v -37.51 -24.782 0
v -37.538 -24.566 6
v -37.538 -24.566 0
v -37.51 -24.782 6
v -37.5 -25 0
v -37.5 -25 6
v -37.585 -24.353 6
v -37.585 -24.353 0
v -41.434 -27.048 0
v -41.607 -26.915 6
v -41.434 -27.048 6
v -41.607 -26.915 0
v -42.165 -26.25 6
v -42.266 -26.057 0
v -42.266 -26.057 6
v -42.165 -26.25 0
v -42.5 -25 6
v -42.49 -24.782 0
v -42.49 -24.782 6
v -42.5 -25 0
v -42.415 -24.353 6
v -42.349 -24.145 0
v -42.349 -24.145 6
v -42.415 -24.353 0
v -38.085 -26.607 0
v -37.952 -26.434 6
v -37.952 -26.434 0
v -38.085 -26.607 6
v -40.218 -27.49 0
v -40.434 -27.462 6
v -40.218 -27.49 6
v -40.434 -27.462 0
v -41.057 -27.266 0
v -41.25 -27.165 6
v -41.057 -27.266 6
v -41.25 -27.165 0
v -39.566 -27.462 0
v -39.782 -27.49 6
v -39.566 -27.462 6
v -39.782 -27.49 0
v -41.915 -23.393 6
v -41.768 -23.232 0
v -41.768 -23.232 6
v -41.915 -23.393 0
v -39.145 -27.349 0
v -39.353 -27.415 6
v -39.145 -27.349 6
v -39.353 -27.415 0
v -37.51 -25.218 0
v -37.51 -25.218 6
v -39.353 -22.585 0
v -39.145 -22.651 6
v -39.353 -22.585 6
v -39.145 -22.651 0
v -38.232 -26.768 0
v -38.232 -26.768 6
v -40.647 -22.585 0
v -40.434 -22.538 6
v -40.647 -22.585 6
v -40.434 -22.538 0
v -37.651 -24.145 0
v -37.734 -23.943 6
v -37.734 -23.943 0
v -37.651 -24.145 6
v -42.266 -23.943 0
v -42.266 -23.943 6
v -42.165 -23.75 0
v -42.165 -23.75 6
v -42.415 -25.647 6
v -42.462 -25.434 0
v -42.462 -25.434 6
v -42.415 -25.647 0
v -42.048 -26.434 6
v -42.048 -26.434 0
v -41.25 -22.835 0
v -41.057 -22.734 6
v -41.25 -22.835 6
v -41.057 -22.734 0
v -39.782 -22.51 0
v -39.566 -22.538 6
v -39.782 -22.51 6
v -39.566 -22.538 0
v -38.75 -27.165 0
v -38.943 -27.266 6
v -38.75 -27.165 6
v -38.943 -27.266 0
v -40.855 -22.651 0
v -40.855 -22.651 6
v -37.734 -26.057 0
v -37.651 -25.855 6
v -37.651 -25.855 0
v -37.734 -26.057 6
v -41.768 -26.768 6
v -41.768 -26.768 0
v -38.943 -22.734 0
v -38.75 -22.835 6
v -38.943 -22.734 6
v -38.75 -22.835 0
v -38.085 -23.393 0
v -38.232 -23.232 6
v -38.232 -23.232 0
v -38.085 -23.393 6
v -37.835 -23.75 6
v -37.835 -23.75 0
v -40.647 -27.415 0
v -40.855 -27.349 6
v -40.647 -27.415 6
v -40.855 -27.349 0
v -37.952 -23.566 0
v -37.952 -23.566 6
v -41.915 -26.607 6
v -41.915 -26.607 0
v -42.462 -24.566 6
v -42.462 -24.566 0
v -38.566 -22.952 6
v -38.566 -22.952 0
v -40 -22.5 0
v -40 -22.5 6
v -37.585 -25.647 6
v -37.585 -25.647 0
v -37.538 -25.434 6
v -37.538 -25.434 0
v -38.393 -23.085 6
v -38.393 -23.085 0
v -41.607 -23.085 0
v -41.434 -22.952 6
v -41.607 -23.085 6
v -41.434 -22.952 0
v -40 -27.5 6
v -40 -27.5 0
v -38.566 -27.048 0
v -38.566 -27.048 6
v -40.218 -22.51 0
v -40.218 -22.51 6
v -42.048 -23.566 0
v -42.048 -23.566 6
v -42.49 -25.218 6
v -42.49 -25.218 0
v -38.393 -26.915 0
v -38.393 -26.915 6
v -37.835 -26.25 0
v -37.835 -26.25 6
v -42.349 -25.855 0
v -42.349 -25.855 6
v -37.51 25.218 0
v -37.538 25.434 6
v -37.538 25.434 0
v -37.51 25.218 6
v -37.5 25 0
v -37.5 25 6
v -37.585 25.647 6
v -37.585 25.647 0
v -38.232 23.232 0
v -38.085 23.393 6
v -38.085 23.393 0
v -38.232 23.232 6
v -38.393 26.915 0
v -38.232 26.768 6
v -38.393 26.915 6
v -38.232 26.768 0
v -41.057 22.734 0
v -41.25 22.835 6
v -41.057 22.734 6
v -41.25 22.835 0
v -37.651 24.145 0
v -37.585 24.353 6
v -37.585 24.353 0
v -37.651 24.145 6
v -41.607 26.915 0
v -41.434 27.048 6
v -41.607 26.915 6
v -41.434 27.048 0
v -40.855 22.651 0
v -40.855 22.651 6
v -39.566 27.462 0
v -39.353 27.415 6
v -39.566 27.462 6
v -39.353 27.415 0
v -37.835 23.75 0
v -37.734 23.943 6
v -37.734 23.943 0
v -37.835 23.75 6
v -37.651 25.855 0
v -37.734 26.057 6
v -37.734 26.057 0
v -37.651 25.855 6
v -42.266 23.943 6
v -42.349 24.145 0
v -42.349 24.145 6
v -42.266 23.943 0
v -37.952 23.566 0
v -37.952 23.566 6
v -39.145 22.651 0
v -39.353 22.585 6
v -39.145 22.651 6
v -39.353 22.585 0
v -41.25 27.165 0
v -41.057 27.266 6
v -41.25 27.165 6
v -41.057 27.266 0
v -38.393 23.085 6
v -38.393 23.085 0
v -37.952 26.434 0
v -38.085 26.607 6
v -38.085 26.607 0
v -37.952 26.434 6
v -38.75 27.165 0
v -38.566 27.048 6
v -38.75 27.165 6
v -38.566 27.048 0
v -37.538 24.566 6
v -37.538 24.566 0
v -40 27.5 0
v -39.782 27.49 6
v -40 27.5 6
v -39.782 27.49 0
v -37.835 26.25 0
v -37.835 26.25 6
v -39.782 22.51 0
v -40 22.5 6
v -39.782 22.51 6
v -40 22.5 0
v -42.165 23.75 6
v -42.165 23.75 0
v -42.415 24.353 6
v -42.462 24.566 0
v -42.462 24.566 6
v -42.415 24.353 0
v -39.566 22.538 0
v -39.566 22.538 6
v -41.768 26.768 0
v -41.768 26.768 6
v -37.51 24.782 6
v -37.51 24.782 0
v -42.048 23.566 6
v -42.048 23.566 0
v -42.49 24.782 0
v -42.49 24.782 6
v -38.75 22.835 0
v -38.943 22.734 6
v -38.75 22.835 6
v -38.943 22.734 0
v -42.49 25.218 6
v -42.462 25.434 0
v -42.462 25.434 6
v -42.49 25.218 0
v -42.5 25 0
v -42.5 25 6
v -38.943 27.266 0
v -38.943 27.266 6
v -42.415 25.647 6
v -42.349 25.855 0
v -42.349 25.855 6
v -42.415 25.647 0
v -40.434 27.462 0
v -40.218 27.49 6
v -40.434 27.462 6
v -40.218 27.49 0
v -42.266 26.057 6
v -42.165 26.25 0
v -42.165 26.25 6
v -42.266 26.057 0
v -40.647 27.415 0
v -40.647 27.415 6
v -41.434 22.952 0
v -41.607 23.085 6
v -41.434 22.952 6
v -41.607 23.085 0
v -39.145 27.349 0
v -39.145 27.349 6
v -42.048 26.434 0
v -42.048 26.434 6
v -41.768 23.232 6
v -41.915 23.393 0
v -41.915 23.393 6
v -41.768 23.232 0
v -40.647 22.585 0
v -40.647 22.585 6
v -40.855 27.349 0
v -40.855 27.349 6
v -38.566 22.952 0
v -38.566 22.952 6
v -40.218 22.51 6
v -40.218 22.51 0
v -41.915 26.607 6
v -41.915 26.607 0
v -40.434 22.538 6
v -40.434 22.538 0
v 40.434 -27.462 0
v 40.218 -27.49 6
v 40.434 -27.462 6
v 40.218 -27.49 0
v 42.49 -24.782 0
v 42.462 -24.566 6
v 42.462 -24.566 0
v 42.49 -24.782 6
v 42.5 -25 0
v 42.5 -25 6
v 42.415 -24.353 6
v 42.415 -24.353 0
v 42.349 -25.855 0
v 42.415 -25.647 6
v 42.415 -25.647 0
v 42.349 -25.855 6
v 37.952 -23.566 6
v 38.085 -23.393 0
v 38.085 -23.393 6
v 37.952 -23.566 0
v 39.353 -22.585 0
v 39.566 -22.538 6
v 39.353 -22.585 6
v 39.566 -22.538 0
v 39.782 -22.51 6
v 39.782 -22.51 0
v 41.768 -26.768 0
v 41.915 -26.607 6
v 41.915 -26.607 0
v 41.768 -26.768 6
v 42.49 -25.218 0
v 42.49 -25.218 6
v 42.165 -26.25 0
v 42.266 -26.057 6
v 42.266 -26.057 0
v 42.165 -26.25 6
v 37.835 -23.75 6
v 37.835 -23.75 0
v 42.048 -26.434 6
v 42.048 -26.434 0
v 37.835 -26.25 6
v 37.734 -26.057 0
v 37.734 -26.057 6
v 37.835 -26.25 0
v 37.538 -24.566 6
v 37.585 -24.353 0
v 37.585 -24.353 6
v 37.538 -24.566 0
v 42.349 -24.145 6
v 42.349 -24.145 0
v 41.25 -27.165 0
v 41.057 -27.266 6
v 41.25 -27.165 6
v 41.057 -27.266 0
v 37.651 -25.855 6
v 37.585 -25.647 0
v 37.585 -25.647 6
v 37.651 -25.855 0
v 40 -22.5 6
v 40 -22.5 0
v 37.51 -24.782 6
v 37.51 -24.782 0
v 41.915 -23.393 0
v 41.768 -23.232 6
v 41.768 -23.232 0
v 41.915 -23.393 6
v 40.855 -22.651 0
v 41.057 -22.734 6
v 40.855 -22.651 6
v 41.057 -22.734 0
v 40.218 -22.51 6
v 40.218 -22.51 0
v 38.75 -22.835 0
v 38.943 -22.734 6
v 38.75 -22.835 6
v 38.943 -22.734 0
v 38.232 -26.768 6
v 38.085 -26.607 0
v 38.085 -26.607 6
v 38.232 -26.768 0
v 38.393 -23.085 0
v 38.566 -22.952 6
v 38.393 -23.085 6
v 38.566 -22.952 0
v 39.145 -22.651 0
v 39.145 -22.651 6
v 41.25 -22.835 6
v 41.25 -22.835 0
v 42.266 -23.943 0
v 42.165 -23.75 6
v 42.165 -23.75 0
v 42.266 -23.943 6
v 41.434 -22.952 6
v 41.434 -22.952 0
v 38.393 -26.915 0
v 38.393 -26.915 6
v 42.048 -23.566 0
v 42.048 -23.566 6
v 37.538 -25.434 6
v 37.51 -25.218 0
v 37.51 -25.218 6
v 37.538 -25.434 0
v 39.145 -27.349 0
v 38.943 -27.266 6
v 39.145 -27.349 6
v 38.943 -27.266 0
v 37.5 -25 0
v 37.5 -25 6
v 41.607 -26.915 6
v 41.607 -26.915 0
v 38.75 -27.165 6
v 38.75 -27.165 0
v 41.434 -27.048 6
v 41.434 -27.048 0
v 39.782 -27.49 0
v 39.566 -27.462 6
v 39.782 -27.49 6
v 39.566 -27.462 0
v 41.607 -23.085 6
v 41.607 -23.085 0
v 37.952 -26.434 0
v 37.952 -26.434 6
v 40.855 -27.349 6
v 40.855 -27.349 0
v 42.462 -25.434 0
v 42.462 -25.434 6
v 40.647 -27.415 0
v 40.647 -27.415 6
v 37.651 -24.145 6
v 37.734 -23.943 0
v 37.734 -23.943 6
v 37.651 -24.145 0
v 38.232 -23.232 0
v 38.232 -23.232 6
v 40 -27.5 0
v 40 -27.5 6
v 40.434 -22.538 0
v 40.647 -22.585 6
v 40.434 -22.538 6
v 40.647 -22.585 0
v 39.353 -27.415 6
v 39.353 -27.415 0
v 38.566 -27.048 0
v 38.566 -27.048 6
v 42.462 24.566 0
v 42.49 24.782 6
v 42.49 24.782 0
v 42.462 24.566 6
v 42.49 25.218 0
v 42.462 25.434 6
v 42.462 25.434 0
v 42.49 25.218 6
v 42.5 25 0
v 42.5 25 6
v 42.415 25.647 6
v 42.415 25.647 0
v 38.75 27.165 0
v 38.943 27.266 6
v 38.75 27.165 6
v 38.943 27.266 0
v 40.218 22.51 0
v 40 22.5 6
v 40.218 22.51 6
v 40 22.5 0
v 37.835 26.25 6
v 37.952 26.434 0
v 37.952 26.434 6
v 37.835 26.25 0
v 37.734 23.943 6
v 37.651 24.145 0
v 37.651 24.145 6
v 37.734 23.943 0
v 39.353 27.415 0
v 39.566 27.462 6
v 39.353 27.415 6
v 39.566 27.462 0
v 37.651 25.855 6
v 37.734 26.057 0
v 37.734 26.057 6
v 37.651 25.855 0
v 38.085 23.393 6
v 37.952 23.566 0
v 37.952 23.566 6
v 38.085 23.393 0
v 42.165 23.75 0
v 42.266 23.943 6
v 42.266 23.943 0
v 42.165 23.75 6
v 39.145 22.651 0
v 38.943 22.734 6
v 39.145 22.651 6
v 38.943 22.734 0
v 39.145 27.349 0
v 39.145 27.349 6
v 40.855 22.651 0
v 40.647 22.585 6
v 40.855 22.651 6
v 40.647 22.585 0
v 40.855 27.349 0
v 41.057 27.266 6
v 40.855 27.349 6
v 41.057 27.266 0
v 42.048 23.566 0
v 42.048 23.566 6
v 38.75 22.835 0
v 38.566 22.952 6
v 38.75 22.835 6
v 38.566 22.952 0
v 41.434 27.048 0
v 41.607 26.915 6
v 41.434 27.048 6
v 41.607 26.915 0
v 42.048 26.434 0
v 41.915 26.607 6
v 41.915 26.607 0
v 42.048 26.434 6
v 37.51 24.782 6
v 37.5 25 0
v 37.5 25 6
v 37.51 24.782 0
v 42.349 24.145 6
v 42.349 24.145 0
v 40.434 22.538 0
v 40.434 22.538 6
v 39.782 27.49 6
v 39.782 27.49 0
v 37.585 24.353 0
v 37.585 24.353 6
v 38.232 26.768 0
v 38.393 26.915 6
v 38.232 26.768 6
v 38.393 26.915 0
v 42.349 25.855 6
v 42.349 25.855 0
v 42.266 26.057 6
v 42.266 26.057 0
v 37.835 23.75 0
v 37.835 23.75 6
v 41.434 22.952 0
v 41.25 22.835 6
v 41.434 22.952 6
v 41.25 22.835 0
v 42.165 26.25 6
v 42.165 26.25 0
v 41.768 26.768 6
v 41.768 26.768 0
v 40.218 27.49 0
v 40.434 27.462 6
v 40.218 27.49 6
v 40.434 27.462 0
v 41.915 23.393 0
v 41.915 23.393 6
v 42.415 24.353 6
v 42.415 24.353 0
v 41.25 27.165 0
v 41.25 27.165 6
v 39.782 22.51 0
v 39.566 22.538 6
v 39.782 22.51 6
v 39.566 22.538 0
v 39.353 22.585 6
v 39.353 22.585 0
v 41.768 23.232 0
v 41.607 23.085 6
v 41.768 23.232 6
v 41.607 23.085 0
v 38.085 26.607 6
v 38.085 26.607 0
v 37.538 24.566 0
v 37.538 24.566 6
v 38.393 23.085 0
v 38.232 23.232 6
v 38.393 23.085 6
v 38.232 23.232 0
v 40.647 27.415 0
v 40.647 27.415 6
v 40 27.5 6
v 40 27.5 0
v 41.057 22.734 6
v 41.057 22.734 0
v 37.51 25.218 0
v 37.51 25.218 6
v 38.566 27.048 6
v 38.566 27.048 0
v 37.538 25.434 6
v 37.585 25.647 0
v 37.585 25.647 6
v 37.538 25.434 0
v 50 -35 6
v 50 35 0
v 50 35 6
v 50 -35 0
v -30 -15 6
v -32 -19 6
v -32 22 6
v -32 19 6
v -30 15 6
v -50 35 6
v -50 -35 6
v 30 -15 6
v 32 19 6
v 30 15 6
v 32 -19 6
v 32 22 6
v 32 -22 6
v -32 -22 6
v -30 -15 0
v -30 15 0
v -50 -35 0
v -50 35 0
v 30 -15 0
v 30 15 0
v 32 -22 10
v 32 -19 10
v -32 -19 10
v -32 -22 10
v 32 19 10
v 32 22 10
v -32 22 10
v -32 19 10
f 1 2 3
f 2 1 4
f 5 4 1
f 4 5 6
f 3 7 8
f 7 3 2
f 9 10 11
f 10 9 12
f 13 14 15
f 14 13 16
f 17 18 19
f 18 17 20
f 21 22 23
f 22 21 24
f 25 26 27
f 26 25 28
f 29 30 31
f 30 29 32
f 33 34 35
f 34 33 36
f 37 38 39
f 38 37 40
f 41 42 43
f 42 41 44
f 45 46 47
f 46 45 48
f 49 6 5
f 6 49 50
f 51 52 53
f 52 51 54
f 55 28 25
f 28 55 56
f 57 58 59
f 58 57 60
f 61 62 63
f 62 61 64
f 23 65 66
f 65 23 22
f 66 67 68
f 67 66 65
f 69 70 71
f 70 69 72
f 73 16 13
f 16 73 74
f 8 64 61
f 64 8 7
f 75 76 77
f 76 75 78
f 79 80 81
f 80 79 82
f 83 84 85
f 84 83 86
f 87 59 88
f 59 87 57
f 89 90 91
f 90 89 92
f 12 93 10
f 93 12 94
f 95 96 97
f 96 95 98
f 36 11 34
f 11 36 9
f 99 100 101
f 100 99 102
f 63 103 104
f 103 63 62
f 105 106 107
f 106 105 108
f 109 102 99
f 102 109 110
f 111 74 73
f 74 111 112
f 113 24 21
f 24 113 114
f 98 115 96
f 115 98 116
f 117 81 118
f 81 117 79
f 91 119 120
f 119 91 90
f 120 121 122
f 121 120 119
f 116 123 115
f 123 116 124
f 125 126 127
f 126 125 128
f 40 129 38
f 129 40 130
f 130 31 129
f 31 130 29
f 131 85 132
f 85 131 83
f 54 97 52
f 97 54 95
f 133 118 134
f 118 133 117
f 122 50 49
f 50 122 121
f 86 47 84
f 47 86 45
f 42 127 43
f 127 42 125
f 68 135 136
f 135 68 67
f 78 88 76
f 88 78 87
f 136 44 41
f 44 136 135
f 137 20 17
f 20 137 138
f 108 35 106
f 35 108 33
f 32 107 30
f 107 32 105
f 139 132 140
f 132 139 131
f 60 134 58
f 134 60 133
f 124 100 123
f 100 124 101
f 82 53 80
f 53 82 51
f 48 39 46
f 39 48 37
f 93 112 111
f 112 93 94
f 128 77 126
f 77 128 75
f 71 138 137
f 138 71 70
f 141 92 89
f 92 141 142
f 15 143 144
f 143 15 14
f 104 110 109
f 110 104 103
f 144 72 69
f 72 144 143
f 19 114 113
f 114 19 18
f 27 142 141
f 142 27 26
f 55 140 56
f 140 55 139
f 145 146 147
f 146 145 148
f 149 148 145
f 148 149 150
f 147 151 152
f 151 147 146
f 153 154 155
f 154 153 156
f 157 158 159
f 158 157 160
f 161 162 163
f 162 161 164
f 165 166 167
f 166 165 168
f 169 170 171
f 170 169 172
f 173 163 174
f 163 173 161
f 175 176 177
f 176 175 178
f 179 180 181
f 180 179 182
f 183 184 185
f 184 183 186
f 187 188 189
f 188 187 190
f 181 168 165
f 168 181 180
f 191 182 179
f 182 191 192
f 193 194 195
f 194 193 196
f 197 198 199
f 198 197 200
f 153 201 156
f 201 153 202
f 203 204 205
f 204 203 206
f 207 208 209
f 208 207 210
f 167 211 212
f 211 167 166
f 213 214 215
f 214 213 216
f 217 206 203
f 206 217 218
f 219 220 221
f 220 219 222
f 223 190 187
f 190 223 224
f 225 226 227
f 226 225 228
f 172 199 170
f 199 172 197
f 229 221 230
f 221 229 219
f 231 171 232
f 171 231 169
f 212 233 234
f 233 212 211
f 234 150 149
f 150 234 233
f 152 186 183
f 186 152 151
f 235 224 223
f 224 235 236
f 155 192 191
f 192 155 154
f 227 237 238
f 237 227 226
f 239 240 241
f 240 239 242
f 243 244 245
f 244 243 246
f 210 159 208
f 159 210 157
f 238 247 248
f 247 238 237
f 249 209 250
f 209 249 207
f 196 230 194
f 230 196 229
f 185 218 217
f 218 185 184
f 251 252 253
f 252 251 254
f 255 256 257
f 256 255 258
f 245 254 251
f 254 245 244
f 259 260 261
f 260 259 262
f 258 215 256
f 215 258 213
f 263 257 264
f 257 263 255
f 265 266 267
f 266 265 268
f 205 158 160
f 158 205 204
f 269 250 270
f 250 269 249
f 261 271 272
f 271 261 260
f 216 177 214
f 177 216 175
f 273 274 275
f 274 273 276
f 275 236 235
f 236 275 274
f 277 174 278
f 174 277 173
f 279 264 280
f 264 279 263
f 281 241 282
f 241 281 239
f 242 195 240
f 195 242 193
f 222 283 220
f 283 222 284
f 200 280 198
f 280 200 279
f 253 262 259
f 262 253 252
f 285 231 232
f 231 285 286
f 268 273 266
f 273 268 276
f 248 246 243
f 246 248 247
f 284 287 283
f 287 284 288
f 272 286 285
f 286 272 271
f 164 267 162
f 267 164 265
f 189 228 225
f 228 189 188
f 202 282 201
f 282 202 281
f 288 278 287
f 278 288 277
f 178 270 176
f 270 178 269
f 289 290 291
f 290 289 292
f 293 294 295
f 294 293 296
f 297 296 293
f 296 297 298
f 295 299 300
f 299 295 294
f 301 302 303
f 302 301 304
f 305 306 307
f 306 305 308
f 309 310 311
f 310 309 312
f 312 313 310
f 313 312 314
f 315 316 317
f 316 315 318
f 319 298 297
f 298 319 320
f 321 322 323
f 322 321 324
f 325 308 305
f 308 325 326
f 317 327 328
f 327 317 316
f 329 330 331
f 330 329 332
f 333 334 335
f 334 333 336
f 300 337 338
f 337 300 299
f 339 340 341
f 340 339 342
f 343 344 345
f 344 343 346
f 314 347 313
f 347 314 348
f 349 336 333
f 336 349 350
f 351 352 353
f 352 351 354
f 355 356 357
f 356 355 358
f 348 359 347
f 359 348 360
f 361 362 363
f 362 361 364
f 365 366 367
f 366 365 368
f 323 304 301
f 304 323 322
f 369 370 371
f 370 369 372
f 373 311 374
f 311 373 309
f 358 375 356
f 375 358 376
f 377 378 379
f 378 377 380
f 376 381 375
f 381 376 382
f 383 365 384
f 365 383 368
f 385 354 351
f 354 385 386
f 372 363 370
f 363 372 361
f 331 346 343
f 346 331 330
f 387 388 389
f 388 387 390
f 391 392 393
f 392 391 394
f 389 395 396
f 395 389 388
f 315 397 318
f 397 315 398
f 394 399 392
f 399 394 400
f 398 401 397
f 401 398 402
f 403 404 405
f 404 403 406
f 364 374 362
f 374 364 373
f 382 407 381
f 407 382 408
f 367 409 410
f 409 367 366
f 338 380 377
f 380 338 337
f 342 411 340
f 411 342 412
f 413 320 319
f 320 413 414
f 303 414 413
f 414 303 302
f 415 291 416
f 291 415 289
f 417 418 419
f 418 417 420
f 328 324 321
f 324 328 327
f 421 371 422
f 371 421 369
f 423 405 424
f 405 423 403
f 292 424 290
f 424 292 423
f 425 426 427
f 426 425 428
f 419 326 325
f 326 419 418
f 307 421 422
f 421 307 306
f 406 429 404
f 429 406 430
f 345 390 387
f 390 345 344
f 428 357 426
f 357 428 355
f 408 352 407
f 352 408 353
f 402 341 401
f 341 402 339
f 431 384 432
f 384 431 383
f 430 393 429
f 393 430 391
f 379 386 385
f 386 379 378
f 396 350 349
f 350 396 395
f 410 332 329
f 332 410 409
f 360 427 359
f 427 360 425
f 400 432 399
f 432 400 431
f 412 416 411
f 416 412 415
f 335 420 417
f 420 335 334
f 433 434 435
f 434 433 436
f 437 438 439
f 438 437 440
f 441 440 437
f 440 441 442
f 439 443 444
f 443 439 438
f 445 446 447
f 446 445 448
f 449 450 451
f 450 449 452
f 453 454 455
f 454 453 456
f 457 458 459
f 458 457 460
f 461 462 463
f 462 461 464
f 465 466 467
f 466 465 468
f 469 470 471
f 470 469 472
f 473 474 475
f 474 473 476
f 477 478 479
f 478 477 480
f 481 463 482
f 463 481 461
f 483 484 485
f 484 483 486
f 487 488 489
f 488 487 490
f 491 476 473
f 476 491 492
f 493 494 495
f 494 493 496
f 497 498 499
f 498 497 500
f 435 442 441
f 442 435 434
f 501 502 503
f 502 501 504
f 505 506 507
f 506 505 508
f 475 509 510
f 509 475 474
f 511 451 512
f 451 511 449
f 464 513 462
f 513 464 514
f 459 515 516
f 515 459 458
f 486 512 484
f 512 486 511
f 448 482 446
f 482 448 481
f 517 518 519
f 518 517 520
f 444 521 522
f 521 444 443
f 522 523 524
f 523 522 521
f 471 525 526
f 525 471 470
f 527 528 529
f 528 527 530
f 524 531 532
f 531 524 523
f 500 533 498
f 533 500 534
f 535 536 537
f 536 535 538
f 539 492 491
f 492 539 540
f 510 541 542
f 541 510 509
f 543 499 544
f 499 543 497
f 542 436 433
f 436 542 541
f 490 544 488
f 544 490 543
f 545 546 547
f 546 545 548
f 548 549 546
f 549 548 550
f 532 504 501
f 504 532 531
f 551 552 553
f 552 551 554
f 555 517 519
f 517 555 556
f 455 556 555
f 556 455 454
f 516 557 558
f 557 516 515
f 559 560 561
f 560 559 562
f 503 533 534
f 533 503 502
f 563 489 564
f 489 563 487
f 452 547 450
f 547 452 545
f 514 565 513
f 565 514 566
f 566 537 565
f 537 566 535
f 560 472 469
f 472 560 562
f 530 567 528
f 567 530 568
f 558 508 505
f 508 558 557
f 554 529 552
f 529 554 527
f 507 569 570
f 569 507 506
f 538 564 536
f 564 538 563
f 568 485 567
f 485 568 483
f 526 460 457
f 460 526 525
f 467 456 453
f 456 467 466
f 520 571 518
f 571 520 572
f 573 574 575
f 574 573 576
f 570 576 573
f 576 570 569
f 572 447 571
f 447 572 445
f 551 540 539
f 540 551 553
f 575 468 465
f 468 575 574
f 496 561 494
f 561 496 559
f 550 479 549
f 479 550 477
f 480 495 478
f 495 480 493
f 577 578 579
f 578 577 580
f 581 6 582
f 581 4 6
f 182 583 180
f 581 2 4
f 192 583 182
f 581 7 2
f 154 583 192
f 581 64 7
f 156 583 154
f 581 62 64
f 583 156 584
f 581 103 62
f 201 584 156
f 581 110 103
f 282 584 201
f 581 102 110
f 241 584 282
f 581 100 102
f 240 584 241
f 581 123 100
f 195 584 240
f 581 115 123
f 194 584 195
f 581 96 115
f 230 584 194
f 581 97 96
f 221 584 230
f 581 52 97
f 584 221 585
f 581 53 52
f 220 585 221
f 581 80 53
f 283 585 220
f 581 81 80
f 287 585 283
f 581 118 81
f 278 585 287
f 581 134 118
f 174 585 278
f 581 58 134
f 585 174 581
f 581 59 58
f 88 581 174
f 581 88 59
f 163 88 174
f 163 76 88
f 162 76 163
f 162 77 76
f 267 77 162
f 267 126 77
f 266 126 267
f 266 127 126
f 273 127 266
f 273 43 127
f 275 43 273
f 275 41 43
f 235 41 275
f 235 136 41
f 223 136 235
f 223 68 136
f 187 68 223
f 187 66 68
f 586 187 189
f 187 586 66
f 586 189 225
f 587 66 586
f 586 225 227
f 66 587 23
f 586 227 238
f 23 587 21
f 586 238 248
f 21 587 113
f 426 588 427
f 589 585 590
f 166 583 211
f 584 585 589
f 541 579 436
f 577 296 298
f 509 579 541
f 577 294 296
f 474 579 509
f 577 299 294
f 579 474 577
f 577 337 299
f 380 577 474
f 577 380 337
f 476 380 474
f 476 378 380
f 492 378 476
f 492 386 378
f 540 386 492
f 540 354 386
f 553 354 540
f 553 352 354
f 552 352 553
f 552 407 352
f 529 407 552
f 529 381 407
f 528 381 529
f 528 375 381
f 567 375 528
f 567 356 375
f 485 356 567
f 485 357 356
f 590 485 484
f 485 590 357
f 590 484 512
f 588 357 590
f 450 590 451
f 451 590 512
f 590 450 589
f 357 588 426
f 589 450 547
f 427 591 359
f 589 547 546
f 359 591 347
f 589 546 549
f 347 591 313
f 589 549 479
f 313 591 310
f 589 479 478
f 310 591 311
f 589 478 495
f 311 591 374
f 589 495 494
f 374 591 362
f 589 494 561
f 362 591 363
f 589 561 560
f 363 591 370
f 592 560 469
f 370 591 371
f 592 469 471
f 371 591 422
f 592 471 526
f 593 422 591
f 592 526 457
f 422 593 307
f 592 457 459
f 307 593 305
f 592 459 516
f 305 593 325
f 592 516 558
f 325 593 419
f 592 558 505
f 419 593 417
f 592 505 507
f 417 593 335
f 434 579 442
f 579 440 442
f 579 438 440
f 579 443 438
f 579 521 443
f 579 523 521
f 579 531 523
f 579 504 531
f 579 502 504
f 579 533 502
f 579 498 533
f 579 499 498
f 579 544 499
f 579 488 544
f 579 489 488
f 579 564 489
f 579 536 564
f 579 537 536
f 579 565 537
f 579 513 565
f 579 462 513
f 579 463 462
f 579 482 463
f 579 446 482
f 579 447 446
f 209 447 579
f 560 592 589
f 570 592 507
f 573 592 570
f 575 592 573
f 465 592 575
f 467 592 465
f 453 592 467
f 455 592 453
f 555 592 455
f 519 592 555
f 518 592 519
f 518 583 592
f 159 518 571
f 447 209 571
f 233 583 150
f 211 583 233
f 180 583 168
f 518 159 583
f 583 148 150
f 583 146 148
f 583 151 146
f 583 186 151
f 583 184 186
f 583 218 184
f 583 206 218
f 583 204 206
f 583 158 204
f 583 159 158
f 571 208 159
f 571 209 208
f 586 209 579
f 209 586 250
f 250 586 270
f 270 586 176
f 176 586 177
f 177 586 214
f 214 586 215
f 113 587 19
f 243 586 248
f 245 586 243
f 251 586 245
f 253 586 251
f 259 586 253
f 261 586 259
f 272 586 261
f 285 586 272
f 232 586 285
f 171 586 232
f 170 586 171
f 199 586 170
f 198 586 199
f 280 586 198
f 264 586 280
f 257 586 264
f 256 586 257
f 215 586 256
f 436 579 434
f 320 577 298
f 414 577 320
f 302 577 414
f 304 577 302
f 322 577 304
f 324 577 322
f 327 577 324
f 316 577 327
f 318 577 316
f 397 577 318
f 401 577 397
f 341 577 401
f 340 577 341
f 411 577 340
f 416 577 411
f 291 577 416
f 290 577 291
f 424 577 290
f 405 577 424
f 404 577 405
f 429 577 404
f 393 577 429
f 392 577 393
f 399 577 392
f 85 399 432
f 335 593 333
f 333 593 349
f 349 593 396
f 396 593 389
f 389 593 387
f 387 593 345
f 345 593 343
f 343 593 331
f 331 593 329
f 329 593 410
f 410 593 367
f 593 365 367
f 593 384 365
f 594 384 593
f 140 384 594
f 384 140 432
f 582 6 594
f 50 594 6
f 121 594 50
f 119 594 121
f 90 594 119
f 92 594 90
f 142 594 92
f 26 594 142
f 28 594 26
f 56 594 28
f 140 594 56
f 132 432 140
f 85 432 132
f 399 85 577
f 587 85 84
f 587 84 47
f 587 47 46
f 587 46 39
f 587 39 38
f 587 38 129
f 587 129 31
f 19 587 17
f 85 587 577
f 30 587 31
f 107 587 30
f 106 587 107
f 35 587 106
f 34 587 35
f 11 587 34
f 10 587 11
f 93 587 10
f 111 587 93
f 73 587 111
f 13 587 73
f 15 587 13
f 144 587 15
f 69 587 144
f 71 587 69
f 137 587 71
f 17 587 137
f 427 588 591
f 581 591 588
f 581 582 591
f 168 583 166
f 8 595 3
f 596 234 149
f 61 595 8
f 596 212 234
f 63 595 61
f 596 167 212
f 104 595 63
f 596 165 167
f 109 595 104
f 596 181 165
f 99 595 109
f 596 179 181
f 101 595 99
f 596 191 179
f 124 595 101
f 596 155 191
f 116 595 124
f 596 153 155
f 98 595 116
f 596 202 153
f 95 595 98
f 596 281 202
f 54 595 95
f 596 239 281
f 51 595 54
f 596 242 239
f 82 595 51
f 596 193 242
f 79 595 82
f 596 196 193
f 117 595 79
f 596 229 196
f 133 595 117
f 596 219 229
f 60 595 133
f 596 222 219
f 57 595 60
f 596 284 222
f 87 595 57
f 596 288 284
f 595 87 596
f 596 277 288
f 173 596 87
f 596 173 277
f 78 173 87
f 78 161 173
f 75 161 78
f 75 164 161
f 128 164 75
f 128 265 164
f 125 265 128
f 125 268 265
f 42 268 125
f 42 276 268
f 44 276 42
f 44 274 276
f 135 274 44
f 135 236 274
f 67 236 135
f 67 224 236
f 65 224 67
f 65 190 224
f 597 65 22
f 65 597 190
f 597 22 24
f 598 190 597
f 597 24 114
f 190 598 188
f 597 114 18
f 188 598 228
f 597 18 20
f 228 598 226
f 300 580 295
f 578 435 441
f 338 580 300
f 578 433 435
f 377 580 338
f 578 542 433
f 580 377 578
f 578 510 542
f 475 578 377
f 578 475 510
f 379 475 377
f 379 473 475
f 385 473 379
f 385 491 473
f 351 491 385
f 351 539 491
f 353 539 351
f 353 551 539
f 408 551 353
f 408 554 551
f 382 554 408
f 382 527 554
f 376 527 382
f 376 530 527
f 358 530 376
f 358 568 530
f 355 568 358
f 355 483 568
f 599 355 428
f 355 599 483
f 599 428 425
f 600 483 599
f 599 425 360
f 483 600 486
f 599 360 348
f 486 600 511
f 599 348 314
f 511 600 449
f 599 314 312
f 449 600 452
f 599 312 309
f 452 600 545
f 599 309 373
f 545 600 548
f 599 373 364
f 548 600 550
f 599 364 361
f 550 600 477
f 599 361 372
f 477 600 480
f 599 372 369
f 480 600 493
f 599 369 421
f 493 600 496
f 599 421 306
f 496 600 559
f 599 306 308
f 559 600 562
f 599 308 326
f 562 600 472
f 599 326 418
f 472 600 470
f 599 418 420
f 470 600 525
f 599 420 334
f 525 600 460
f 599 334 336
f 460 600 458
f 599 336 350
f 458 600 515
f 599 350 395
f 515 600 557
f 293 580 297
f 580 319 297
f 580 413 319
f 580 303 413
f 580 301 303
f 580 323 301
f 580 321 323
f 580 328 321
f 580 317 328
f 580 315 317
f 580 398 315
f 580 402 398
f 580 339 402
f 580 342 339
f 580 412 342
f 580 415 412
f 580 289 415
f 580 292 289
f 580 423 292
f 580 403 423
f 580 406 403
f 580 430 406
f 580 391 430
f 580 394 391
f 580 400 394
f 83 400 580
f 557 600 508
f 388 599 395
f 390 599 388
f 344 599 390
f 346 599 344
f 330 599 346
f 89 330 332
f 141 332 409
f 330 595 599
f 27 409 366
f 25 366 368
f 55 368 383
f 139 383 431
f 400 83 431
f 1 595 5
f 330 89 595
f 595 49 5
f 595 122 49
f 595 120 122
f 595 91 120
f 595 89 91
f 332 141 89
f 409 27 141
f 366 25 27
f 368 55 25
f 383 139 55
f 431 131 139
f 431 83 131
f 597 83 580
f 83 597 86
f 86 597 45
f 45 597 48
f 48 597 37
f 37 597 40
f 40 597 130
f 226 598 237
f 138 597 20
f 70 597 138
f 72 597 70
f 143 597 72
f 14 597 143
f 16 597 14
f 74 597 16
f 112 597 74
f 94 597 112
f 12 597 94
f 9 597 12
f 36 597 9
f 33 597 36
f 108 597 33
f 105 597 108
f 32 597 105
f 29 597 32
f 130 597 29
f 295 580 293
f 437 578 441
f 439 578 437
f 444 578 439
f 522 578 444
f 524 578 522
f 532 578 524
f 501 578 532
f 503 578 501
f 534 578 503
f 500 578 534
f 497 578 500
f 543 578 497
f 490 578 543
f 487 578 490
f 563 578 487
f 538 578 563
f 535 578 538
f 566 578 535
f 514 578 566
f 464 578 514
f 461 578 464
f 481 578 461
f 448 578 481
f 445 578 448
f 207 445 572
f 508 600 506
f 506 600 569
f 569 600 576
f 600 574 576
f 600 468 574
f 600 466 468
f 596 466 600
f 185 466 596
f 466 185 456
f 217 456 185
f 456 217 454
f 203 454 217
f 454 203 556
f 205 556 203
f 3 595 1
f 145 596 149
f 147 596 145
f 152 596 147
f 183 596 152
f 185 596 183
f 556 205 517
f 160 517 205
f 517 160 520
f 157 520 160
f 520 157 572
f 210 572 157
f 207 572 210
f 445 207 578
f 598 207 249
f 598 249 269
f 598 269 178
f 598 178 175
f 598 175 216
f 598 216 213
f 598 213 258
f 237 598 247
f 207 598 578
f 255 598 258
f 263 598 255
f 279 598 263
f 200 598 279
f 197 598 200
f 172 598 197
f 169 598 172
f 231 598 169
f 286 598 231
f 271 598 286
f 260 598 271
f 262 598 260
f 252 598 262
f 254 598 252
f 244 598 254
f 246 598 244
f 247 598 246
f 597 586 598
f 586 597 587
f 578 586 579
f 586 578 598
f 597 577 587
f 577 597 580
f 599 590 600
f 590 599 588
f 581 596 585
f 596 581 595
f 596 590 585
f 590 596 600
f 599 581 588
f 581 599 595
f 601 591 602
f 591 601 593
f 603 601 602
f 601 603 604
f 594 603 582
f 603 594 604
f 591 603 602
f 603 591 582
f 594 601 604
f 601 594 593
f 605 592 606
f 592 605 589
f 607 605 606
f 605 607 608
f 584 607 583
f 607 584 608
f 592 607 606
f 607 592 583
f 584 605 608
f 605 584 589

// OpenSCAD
// Microfluidic chip imaging holder — reference solution
// Category: tools; purpose: repeatable positioning during optical chip imaging
// Print on flat base with z=0 on bed; PLA/PETG, no supports; not certified for clinical or sterile use
// SPDX-License-Identifier: CERN-OHL-P-2.0
$fn=72;
eps=0.05;
base_x=100;
base_y=70;
base_h=6;
window_x=60;
window_y=30;
hole_d=5;
hole_pitch_x=80;
hole_pitch_y=50;
rail_len=64;
rail_width=3;
rail_h=4;
rail_center_y=20.5;
marker_x=7;
marker_y=7;
marker_h=2;
marker_center_x=39;
assert(base_x > window_x + 2*hole_d);
assert(base_y > window_y + 2*hole_d);
assert(hole_pitch_x/2+hole_d/2 < base_x/2);
assert(hole_pitch_y/2+hole_d/2 < base_y/2);
assert(rail_center_y - rail_width/2 > window_y/2);
module reference(){
 union(){
  difference(){
   translate([-base_x/2,-base_y/2,0]) cube([base_x,base_y,base_h]);
   translate([-window_x/2,-window_y/2,-eps]) cube([window_x,window_y,base_h+2*eps]);
   for(x=[-hole_pitch_x/2,hole_pitch_x/2])
    for(y=[-hole_pitch_y/2,hole_pitch_y/2])
     translate([x,y,-eps]) cylinder(d=hole_d,h=base_h+2*eps);
  }
  for(y=[-rail_center_y,rail_center_y])
   translate([-rail_len/2,y-rail_width/2,base_h-eps])
    cube([rail_len,rail_width,rail_h+eps]);
  // marker intentionally omitted
 }
}
reference();
